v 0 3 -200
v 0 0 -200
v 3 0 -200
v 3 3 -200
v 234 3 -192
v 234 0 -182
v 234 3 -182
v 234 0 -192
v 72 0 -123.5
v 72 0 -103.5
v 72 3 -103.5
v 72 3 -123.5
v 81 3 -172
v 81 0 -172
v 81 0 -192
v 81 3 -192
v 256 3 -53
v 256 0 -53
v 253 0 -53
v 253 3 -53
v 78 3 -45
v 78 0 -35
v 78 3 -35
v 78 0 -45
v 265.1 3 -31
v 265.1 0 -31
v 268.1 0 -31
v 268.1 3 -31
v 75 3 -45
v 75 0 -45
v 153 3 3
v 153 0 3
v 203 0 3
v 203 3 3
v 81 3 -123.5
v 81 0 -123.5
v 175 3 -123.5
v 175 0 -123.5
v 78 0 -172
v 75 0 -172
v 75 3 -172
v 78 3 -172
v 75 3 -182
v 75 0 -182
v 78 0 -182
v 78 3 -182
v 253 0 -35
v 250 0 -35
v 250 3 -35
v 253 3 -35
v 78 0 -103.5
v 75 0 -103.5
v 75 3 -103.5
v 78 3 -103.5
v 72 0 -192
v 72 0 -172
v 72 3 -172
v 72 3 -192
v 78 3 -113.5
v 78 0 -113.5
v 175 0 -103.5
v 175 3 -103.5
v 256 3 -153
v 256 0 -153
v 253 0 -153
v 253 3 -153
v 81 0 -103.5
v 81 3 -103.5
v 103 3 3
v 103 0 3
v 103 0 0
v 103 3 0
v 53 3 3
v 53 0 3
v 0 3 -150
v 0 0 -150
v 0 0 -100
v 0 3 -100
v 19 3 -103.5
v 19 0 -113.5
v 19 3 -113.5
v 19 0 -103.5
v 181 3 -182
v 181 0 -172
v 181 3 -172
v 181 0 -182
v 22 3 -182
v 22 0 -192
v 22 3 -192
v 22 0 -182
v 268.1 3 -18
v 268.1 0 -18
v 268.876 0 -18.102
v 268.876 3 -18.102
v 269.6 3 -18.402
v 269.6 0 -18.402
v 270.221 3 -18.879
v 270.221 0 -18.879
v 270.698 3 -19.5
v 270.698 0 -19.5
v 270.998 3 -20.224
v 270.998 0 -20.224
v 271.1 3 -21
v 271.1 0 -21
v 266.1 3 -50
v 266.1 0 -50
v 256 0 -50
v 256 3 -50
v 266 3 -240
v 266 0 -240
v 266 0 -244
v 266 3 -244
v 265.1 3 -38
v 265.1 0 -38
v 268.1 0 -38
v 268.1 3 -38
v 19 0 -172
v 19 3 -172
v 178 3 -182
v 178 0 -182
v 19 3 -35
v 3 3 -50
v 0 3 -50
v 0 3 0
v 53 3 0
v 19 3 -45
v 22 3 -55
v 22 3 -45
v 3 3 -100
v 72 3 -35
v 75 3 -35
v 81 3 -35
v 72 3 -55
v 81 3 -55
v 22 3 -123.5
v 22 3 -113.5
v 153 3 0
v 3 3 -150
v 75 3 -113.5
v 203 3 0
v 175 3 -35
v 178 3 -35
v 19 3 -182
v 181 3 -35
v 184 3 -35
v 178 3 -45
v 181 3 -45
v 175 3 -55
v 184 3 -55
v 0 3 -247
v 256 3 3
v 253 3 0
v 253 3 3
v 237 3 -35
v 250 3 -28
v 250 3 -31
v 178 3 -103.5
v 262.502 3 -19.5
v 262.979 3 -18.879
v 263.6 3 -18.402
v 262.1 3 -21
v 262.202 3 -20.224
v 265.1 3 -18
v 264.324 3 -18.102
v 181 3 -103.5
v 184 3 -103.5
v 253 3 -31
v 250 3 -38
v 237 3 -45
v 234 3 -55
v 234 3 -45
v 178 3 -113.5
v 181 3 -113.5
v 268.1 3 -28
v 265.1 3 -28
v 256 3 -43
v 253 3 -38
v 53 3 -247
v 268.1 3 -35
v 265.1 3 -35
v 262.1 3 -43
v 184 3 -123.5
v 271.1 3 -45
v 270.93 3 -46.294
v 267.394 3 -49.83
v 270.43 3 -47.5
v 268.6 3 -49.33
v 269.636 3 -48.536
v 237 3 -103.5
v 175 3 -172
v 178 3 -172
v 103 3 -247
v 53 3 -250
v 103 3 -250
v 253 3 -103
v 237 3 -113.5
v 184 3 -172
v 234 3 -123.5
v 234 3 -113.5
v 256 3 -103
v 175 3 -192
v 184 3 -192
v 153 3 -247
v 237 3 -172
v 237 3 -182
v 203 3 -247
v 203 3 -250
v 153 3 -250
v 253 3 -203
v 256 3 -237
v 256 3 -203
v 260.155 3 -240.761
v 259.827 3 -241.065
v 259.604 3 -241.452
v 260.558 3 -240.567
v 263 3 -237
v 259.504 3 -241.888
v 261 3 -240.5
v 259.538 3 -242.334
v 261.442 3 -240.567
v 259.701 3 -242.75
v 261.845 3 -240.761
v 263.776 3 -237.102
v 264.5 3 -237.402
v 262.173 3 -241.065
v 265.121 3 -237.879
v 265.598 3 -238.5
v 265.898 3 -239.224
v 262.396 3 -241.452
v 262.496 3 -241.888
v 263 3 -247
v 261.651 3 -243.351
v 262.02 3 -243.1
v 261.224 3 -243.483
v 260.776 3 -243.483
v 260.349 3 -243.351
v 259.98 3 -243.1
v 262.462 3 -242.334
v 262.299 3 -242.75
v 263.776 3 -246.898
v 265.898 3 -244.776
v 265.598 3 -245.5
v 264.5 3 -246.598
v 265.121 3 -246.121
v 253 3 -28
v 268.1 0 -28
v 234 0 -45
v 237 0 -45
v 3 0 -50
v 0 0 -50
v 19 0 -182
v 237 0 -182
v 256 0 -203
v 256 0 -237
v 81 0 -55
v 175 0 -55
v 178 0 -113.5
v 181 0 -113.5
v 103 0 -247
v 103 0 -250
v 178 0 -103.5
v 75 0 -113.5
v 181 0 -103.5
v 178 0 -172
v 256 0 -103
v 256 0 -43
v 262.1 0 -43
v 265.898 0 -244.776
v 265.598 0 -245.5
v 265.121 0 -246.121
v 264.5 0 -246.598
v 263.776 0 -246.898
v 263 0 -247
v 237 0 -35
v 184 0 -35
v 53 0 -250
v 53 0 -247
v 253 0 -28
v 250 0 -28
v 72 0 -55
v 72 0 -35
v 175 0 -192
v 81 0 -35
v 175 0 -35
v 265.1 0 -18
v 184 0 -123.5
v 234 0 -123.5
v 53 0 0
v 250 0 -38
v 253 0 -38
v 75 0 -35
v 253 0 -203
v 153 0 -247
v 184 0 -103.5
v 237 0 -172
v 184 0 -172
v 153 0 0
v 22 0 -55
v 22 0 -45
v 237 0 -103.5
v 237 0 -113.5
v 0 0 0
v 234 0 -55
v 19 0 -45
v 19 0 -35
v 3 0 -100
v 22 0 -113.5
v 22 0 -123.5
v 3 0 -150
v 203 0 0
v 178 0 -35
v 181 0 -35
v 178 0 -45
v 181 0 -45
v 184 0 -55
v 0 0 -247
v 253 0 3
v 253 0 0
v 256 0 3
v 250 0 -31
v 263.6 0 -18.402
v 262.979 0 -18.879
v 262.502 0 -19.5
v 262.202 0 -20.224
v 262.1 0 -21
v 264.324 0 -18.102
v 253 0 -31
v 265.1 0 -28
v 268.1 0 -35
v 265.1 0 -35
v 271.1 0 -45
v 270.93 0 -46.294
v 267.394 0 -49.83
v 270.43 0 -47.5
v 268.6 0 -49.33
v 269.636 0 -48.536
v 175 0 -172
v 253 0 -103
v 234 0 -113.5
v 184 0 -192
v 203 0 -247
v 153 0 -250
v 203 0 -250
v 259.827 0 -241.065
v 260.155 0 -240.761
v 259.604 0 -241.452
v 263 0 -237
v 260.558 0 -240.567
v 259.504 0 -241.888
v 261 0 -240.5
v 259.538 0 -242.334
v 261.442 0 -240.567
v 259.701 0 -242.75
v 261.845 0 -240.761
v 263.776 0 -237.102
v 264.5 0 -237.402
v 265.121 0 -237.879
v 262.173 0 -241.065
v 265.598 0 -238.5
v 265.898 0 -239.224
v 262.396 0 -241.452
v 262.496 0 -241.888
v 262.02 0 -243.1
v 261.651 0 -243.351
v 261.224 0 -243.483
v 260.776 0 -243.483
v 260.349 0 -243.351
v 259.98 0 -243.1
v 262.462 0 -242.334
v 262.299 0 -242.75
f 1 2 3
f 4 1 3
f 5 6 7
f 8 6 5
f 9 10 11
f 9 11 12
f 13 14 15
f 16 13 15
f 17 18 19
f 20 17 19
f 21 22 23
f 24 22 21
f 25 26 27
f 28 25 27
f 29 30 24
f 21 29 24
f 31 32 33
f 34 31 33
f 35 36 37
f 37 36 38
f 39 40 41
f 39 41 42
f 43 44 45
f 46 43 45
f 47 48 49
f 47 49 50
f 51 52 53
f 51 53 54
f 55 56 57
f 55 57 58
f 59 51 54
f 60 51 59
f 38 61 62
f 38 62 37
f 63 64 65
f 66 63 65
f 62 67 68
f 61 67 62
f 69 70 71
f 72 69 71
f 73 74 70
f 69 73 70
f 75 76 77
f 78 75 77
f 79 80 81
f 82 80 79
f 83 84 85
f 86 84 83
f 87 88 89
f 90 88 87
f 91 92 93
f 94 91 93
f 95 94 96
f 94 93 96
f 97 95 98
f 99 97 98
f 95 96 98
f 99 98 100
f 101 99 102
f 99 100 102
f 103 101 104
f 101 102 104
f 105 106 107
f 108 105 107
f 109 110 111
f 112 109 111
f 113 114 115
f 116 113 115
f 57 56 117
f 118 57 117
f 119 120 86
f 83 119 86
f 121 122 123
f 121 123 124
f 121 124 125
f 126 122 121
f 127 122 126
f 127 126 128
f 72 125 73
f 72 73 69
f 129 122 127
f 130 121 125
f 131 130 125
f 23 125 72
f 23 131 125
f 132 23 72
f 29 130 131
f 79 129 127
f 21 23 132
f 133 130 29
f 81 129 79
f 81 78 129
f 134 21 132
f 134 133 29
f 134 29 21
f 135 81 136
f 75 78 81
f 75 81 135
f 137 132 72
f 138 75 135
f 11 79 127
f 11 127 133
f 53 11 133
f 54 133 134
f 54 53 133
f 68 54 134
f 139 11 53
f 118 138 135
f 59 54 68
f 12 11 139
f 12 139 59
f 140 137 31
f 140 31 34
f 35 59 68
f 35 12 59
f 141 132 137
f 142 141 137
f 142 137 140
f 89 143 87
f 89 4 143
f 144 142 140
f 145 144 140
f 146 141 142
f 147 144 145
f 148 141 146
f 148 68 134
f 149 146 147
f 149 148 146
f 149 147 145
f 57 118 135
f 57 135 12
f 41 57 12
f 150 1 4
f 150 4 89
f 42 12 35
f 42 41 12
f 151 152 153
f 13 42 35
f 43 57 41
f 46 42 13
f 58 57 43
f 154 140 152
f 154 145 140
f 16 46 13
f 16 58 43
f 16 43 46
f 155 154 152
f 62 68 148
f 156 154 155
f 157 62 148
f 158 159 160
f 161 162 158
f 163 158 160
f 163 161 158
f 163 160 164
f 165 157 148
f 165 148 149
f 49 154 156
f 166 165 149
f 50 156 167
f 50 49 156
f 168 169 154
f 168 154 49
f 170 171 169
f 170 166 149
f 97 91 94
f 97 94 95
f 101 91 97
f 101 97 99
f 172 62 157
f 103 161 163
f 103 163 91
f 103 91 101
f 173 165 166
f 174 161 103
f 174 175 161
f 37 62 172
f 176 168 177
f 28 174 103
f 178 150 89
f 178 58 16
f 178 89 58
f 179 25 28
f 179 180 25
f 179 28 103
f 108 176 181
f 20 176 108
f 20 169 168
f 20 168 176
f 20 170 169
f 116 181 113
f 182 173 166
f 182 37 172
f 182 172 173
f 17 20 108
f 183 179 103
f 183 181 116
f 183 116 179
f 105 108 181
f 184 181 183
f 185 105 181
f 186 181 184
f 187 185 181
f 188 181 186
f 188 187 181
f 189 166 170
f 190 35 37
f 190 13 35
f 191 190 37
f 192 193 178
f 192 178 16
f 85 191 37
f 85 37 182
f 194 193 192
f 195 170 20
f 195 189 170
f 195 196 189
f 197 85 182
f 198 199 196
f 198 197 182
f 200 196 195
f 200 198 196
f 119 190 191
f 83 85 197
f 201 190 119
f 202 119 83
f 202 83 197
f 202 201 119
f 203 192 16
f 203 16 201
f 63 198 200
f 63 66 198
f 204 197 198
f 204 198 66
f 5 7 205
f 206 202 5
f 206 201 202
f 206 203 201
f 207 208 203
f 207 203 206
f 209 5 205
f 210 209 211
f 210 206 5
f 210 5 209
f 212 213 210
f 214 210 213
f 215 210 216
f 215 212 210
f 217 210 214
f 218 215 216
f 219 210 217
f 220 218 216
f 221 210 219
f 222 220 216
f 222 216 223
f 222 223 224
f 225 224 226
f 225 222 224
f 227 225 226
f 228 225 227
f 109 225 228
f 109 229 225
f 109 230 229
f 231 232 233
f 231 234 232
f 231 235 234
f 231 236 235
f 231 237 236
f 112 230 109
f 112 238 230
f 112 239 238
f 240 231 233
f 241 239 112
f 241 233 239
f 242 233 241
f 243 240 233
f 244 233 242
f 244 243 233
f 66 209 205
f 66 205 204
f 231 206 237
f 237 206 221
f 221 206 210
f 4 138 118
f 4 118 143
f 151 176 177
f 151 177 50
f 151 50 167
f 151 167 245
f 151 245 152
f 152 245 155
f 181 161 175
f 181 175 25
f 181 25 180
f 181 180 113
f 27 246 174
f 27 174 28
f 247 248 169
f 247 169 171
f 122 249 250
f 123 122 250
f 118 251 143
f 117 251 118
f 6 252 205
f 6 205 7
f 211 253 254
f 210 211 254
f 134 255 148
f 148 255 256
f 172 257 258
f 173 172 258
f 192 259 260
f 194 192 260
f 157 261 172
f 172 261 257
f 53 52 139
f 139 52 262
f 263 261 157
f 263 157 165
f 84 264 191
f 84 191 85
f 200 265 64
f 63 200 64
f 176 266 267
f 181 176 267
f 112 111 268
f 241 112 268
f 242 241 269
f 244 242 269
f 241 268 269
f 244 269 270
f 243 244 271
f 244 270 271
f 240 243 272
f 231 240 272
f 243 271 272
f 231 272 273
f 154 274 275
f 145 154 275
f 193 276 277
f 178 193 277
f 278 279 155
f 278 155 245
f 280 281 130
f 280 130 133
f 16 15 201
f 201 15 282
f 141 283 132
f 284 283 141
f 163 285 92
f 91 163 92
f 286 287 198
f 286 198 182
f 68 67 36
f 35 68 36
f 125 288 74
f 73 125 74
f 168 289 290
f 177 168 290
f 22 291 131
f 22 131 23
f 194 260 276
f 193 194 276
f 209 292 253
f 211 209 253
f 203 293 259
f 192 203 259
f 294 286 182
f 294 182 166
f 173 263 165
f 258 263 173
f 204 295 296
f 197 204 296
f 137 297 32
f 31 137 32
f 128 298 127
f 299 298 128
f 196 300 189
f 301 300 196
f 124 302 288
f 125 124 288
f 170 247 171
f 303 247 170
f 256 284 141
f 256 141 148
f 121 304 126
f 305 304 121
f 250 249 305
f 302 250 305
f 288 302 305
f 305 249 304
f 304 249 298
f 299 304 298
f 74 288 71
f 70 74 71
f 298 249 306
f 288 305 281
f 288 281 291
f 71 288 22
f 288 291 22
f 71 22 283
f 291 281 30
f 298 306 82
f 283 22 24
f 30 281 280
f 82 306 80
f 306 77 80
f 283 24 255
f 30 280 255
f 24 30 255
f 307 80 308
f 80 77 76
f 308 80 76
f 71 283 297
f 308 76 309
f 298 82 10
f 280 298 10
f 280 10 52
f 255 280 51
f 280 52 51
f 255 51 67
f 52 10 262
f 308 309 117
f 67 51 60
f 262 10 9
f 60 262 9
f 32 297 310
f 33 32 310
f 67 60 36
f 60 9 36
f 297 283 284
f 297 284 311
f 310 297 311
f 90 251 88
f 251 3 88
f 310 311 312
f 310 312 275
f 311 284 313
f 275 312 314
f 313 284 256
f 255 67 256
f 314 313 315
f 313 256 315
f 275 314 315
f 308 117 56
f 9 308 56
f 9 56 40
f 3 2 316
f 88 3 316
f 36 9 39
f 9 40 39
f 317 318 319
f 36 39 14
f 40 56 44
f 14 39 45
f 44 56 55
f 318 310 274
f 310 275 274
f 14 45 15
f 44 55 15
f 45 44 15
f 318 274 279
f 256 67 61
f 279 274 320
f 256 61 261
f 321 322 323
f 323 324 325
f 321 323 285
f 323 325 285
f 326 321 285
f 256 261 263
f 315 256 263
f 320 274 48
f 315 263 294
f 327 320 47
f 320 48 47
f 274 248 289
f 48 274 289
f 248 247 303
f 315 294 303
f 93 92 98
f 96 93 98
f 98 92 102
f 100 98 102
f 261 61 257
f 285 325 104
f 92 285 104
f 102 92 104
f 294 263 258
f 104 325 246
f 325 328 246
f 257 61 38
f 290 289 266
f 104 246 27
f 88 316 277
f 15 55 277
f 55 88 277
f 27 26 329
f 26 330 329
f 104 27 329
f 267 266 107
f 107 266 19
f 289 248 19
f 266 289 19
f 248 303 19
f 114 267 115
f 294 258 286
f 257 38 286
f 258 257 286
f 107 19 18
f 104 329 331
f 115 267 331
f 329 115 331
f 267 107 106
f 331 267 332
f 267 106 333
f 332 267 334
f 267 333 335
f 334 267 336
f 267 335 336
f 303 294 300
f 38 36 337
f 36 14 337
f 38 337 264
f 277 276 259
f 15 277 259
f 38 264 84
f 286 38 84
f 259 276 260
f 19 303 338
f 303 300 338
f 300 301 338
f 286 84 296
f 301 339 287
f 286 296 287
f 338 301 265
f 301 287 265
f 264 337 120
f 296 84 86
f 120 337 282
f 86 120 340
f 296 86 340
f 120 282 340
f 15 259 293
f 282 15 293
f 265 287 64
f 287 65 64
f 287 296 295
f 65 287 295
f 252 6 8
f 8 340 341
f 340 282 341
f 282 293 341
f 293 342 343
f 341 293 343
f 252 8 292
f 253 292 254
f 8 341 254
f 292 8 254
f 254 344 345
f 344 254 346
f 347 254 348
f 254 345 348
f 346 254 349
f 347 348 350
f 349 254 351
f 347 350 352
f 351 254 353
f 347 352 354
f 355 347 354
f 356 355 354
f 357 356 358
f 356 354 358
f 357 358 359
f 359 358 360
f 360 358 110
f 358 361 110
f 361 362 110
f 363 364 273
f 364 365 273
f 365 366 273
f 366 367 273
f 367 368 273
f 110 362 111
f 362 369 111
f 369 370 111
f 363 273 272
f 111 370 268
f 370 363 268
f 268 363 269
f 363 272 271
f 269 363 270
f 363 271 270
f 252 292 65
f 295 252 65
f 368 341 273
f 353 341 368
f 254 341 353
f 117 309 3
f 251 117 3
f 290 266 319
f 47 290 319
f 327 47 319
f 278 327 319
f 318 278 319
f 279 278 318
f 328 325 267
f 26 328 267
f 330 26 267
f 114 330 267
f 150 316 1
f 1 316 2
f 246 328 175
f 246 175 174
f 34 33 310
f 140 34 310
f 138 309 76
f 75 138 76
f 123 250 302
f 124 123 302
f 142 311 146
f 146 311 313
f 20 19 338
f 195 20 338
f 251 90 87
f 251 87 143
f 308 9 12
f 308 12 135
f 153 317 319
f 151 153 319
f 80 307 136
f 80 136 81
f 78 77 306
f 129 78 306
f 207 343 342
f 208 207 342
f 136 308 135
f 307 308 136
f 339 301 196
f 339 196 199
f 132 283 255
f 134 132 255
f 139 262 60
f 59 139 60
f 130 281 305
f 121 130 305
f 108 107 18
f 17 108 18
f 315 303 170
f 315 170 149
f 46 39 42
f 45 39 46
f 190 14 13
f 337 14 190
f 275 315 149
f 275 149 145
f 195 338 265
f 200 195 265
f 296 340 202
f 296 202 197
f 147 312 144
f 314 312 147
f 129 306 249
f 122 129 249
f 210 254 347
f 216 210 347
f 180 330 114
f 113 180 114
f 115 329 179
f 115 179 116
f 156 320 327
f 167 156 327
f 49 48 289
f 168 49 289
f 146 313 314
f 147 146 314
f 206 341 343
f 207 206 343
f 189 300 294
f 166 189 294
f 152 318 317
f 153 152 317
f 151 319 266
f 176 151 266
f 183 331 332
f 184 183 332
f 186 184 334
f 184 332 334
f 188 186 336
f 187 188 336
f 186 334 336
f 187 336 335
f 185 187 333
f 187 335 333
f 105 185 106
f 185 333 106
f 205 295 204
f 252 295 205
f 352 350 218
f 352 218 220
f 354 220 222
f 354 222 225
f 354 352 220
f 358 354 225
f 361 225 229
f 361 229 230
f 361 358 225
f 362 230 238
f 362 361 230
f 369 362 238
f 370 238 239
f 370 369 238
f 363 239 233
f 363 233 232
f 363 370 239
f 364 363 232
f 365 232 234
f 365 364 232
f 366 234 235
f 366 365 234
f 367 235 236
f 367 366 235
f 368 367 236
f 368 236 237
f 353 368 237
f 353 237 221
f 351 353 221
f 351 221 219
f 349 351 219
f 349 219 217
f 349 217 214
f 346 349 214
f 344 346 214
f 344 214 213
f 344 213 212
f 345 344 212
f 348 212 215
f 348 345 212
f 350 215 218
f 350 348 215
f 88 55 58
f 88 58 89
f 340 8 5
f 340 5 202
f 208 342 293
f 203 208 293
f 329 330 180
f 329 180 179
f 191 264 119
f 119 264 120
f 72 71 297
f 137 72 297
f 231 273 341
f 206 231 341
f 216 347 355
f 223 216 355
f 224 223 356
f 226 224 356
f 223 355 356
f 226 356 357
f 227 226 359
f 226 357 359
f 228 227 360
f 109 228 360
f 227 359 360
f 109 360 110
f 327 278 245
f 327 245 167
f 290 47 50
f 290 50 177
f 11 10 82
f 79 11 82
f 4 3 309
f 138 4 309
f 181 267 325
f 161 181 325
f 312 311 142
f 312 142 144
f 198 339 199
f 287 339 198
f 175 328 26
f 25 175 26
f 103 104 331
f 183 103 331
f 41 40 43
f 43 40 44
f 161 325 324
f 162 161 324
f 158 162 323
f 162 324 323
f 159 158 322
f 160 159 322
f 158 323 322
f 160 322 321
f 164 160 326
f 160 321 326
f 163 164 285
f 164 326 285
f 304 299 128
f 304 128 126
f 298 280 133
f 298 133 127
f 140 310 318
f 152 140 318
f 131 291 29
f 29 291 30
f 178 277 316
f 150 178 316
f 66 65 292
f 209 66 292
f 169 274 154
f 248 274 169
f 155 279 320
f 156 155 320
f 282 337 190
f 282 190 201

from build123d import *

# Parameters (mm, degrees)
SKETCH1_R           = 1.5
SKETCH1_W           = 3
SKETCH1_H           = 3
SKETCH1_W_2         = 94
SKETCH1_H_2         = 20
SKETCH1_H_3         = 10
BOSS_EXTRUDE1_DEPTH = 3


with BuildPart() as part:
    # Sketch1 → Boss-Extrude1 (new body)
    with BuildSketch(Plane(origin=(0, 0, 0), x_dir=(1, 0, 0), z_dir=(0, 1, 0))):
        with BuildLine():
            Line((256, 103), (256, 153))
            Line((256, 153), (253, 153))
            Line((253, 153), (253, 203))
            Line((253, 203), (256, 203))
            Line((256, 203), (256, 237))
            Line((256, 237), (263, 237))
            ThreePointArc((263, 237), (265.121320344, 237.878679656), (266, 240))
            Line((266, 240), (266, 244))
            ThreePointArc((266, 244), (265.121320344, 246.121320344), (263, 247))
            Line((263, 247), (253, 247))
            Line((253, 247), (203, 247))
            Line((203, 247), (203, 250))
            Line((203, 250), (153, 250))
            Line((153, 250), (153, 247))
            Line((153, 247), (103, 247))
            Line((103, 247), (103, 250))
            Line((103, 250), (53, 250))
            Line((53, 250), (53, 247))
            Line((53, 247), (0, 247))
            Line((0, 247), (0, 200))
            Line((0, 200), (3, 200))
            Line((3, 200), (3, 150))
            Line((3, 150), (0, 150))
            Line((0, 150), (0, 100))
            Line((0, 100), (3, 100))
            Line((3, 100), (3, 50))
            Line((3, 50), (0, 50))
            Line((0, 50), (0, 0))
            Line((0, 0), (53, 0))
            Line((53, 0), (53, -3))
            Line((53, -3), (103, -3))
            Line((103, -3), (103, 0))
            Line((103, 0), (153, 0))
            Line((153, 0), (153, -3))
            Line((153, -3), (203, -3))
            Line((203, -3), (203, 0))
            Line((203, 0), (253, 0))
            Line((253, 0), (253, -3))
            Line((253, -3), (256, -3))
            Line((256, -3), (256, 0))
            Line((256, 0), (256, 43))
            Line((256, 43), (262.1, 43))
            Line((262.1, 43), (262.1, 21))
            ThreePointArc((262.1, 21), (262.978679656, 18.878679656), (265.1, 18))
            Line((265.1, 18), (268.1, 18))
            ThreePointArc((268.1, 18), (270.221320344, 18.878679656), (271.1, 21))
            Line((271.1, 21), (271.1, 43))
            Line((271.1, 43), (271.1, 45))
            ThreePointArc((271.1, 45), (269.635533906, 48.535533906), (266.1, 50))
            Line((266.1, 50), (256, 50))
            Line((256, 50), (256, 53))
            Line((256, 53), (253, 53))
            Line((253, 53), (253, 103))
            Line((253, 103), (256, 103))
        make_face()
        with Locations(Location((261, 242, 0), (0, 0, 270))):
            Circle(SKETCH1_R, mode=Mode.SUBTRACT)
        with Locations((266.6, 29.5)):
            Rectangle(SKETCH1_W, SKETCH1_H, mode=Mode.SUBTRACT)
        with Locations((128, 45)):
            Rectangle(SKETCH1_W_2, SKETCH1_H_2, mode=Mode.SUBTRACT)
        with Locations((266.6, 36.5)):
            Rectangle(SKETCH1_W, SKETCH1_H, mode=Mode.SUBTRACT)
        with Locations((251.5, 29.5)):
            Rectangle(SKETCH1_W, SKETCH1_H, mode=Mode.SUBTRACT)
        with Locations((251.5, 36.5)):
            Rectangle(SKETCH1_W, SKETCH1_H, mode=Mode.SUBTRACT)
        Polygon((184, 35), (234, 35), (237, 35), (237, 45), (234, 45), (234, 55), (184, 55), align=None, mode=Mode.SUBTRACT)
        with Locations((76.5, 40)):
            Rectangle(SKETCH1_W, SKETCH1_H_3, mode=Mode.SUBTRACT)
        Polygon((184, 103.5), (234, 103.5), (237, 103.5), (237, 113.5), (234, 113.5), (234, 123.5), (184, 123.5), align=None, mode=Mode.SUBTRACT)
        with Locations((179.5, 40)):
            Rectangle(SKETCH1_W, SKETCH1_H_3, mode=Mode.SUBTRACT)
        with Locations((128, 113.5)):
            Rectangle(SKETCH1_W_2, SKETCH1_H_2, mode=Mode.SUBTRACT)
        with Locations((76.5, 108.5)):
            Rectangle(SKETCH1_W, SKETCH1_H_3, mode=Mode.SUBTRACT)
        with Locations((128, 182)):
            Rectangle(SKETCH1_W_2, SKETCH1_H_2, mode=Mode.SUBTRACT)
        with Locations((179.5, 108.5)):
            Rectangle(SKETCH1_W, SKETCH1_H_3, mode=Mode.SUBTRACT)
        Polygon((184, 172), (234, 172), (237, 172), (237, 182), (234, 182), (234, 192), (184, 192), align=None, mode=Mode.SUBTRACT)
        with Locations((76.5, 177)):
            Rectangle(SKETCH1_W, SKETCH1_H_3, mode=Mode.SUBTRACT)
        with Locations((179.5, 177)):
            Rectangle(SKETCH1_W, SKETCH1_H_3, mode=Mode.SUBTRACT)
        Polygon((22, 35), (72, 35), (72, 55), (22, 55), (22, 45), (19, 45), (19, 35), align=None, mode=Mode.SUBTRACT)
        Polygon((22, 103.5), (72, 103.5), (72, 123.5), (22, 123.5), (22, 113.5), (19, 113.5), (19, 103.5), align=None, mode=Mode.SUBTRACT)
        Polygon((22, 172), (72, 172), (72, 192), (22, 192), (22, 182), (19, 182), (19, 172), align=None, mode=Mode.SUBTRACT)
    extrude(amount=BOSS_EXTRUDE1_DEPTH)


solid = part.part
